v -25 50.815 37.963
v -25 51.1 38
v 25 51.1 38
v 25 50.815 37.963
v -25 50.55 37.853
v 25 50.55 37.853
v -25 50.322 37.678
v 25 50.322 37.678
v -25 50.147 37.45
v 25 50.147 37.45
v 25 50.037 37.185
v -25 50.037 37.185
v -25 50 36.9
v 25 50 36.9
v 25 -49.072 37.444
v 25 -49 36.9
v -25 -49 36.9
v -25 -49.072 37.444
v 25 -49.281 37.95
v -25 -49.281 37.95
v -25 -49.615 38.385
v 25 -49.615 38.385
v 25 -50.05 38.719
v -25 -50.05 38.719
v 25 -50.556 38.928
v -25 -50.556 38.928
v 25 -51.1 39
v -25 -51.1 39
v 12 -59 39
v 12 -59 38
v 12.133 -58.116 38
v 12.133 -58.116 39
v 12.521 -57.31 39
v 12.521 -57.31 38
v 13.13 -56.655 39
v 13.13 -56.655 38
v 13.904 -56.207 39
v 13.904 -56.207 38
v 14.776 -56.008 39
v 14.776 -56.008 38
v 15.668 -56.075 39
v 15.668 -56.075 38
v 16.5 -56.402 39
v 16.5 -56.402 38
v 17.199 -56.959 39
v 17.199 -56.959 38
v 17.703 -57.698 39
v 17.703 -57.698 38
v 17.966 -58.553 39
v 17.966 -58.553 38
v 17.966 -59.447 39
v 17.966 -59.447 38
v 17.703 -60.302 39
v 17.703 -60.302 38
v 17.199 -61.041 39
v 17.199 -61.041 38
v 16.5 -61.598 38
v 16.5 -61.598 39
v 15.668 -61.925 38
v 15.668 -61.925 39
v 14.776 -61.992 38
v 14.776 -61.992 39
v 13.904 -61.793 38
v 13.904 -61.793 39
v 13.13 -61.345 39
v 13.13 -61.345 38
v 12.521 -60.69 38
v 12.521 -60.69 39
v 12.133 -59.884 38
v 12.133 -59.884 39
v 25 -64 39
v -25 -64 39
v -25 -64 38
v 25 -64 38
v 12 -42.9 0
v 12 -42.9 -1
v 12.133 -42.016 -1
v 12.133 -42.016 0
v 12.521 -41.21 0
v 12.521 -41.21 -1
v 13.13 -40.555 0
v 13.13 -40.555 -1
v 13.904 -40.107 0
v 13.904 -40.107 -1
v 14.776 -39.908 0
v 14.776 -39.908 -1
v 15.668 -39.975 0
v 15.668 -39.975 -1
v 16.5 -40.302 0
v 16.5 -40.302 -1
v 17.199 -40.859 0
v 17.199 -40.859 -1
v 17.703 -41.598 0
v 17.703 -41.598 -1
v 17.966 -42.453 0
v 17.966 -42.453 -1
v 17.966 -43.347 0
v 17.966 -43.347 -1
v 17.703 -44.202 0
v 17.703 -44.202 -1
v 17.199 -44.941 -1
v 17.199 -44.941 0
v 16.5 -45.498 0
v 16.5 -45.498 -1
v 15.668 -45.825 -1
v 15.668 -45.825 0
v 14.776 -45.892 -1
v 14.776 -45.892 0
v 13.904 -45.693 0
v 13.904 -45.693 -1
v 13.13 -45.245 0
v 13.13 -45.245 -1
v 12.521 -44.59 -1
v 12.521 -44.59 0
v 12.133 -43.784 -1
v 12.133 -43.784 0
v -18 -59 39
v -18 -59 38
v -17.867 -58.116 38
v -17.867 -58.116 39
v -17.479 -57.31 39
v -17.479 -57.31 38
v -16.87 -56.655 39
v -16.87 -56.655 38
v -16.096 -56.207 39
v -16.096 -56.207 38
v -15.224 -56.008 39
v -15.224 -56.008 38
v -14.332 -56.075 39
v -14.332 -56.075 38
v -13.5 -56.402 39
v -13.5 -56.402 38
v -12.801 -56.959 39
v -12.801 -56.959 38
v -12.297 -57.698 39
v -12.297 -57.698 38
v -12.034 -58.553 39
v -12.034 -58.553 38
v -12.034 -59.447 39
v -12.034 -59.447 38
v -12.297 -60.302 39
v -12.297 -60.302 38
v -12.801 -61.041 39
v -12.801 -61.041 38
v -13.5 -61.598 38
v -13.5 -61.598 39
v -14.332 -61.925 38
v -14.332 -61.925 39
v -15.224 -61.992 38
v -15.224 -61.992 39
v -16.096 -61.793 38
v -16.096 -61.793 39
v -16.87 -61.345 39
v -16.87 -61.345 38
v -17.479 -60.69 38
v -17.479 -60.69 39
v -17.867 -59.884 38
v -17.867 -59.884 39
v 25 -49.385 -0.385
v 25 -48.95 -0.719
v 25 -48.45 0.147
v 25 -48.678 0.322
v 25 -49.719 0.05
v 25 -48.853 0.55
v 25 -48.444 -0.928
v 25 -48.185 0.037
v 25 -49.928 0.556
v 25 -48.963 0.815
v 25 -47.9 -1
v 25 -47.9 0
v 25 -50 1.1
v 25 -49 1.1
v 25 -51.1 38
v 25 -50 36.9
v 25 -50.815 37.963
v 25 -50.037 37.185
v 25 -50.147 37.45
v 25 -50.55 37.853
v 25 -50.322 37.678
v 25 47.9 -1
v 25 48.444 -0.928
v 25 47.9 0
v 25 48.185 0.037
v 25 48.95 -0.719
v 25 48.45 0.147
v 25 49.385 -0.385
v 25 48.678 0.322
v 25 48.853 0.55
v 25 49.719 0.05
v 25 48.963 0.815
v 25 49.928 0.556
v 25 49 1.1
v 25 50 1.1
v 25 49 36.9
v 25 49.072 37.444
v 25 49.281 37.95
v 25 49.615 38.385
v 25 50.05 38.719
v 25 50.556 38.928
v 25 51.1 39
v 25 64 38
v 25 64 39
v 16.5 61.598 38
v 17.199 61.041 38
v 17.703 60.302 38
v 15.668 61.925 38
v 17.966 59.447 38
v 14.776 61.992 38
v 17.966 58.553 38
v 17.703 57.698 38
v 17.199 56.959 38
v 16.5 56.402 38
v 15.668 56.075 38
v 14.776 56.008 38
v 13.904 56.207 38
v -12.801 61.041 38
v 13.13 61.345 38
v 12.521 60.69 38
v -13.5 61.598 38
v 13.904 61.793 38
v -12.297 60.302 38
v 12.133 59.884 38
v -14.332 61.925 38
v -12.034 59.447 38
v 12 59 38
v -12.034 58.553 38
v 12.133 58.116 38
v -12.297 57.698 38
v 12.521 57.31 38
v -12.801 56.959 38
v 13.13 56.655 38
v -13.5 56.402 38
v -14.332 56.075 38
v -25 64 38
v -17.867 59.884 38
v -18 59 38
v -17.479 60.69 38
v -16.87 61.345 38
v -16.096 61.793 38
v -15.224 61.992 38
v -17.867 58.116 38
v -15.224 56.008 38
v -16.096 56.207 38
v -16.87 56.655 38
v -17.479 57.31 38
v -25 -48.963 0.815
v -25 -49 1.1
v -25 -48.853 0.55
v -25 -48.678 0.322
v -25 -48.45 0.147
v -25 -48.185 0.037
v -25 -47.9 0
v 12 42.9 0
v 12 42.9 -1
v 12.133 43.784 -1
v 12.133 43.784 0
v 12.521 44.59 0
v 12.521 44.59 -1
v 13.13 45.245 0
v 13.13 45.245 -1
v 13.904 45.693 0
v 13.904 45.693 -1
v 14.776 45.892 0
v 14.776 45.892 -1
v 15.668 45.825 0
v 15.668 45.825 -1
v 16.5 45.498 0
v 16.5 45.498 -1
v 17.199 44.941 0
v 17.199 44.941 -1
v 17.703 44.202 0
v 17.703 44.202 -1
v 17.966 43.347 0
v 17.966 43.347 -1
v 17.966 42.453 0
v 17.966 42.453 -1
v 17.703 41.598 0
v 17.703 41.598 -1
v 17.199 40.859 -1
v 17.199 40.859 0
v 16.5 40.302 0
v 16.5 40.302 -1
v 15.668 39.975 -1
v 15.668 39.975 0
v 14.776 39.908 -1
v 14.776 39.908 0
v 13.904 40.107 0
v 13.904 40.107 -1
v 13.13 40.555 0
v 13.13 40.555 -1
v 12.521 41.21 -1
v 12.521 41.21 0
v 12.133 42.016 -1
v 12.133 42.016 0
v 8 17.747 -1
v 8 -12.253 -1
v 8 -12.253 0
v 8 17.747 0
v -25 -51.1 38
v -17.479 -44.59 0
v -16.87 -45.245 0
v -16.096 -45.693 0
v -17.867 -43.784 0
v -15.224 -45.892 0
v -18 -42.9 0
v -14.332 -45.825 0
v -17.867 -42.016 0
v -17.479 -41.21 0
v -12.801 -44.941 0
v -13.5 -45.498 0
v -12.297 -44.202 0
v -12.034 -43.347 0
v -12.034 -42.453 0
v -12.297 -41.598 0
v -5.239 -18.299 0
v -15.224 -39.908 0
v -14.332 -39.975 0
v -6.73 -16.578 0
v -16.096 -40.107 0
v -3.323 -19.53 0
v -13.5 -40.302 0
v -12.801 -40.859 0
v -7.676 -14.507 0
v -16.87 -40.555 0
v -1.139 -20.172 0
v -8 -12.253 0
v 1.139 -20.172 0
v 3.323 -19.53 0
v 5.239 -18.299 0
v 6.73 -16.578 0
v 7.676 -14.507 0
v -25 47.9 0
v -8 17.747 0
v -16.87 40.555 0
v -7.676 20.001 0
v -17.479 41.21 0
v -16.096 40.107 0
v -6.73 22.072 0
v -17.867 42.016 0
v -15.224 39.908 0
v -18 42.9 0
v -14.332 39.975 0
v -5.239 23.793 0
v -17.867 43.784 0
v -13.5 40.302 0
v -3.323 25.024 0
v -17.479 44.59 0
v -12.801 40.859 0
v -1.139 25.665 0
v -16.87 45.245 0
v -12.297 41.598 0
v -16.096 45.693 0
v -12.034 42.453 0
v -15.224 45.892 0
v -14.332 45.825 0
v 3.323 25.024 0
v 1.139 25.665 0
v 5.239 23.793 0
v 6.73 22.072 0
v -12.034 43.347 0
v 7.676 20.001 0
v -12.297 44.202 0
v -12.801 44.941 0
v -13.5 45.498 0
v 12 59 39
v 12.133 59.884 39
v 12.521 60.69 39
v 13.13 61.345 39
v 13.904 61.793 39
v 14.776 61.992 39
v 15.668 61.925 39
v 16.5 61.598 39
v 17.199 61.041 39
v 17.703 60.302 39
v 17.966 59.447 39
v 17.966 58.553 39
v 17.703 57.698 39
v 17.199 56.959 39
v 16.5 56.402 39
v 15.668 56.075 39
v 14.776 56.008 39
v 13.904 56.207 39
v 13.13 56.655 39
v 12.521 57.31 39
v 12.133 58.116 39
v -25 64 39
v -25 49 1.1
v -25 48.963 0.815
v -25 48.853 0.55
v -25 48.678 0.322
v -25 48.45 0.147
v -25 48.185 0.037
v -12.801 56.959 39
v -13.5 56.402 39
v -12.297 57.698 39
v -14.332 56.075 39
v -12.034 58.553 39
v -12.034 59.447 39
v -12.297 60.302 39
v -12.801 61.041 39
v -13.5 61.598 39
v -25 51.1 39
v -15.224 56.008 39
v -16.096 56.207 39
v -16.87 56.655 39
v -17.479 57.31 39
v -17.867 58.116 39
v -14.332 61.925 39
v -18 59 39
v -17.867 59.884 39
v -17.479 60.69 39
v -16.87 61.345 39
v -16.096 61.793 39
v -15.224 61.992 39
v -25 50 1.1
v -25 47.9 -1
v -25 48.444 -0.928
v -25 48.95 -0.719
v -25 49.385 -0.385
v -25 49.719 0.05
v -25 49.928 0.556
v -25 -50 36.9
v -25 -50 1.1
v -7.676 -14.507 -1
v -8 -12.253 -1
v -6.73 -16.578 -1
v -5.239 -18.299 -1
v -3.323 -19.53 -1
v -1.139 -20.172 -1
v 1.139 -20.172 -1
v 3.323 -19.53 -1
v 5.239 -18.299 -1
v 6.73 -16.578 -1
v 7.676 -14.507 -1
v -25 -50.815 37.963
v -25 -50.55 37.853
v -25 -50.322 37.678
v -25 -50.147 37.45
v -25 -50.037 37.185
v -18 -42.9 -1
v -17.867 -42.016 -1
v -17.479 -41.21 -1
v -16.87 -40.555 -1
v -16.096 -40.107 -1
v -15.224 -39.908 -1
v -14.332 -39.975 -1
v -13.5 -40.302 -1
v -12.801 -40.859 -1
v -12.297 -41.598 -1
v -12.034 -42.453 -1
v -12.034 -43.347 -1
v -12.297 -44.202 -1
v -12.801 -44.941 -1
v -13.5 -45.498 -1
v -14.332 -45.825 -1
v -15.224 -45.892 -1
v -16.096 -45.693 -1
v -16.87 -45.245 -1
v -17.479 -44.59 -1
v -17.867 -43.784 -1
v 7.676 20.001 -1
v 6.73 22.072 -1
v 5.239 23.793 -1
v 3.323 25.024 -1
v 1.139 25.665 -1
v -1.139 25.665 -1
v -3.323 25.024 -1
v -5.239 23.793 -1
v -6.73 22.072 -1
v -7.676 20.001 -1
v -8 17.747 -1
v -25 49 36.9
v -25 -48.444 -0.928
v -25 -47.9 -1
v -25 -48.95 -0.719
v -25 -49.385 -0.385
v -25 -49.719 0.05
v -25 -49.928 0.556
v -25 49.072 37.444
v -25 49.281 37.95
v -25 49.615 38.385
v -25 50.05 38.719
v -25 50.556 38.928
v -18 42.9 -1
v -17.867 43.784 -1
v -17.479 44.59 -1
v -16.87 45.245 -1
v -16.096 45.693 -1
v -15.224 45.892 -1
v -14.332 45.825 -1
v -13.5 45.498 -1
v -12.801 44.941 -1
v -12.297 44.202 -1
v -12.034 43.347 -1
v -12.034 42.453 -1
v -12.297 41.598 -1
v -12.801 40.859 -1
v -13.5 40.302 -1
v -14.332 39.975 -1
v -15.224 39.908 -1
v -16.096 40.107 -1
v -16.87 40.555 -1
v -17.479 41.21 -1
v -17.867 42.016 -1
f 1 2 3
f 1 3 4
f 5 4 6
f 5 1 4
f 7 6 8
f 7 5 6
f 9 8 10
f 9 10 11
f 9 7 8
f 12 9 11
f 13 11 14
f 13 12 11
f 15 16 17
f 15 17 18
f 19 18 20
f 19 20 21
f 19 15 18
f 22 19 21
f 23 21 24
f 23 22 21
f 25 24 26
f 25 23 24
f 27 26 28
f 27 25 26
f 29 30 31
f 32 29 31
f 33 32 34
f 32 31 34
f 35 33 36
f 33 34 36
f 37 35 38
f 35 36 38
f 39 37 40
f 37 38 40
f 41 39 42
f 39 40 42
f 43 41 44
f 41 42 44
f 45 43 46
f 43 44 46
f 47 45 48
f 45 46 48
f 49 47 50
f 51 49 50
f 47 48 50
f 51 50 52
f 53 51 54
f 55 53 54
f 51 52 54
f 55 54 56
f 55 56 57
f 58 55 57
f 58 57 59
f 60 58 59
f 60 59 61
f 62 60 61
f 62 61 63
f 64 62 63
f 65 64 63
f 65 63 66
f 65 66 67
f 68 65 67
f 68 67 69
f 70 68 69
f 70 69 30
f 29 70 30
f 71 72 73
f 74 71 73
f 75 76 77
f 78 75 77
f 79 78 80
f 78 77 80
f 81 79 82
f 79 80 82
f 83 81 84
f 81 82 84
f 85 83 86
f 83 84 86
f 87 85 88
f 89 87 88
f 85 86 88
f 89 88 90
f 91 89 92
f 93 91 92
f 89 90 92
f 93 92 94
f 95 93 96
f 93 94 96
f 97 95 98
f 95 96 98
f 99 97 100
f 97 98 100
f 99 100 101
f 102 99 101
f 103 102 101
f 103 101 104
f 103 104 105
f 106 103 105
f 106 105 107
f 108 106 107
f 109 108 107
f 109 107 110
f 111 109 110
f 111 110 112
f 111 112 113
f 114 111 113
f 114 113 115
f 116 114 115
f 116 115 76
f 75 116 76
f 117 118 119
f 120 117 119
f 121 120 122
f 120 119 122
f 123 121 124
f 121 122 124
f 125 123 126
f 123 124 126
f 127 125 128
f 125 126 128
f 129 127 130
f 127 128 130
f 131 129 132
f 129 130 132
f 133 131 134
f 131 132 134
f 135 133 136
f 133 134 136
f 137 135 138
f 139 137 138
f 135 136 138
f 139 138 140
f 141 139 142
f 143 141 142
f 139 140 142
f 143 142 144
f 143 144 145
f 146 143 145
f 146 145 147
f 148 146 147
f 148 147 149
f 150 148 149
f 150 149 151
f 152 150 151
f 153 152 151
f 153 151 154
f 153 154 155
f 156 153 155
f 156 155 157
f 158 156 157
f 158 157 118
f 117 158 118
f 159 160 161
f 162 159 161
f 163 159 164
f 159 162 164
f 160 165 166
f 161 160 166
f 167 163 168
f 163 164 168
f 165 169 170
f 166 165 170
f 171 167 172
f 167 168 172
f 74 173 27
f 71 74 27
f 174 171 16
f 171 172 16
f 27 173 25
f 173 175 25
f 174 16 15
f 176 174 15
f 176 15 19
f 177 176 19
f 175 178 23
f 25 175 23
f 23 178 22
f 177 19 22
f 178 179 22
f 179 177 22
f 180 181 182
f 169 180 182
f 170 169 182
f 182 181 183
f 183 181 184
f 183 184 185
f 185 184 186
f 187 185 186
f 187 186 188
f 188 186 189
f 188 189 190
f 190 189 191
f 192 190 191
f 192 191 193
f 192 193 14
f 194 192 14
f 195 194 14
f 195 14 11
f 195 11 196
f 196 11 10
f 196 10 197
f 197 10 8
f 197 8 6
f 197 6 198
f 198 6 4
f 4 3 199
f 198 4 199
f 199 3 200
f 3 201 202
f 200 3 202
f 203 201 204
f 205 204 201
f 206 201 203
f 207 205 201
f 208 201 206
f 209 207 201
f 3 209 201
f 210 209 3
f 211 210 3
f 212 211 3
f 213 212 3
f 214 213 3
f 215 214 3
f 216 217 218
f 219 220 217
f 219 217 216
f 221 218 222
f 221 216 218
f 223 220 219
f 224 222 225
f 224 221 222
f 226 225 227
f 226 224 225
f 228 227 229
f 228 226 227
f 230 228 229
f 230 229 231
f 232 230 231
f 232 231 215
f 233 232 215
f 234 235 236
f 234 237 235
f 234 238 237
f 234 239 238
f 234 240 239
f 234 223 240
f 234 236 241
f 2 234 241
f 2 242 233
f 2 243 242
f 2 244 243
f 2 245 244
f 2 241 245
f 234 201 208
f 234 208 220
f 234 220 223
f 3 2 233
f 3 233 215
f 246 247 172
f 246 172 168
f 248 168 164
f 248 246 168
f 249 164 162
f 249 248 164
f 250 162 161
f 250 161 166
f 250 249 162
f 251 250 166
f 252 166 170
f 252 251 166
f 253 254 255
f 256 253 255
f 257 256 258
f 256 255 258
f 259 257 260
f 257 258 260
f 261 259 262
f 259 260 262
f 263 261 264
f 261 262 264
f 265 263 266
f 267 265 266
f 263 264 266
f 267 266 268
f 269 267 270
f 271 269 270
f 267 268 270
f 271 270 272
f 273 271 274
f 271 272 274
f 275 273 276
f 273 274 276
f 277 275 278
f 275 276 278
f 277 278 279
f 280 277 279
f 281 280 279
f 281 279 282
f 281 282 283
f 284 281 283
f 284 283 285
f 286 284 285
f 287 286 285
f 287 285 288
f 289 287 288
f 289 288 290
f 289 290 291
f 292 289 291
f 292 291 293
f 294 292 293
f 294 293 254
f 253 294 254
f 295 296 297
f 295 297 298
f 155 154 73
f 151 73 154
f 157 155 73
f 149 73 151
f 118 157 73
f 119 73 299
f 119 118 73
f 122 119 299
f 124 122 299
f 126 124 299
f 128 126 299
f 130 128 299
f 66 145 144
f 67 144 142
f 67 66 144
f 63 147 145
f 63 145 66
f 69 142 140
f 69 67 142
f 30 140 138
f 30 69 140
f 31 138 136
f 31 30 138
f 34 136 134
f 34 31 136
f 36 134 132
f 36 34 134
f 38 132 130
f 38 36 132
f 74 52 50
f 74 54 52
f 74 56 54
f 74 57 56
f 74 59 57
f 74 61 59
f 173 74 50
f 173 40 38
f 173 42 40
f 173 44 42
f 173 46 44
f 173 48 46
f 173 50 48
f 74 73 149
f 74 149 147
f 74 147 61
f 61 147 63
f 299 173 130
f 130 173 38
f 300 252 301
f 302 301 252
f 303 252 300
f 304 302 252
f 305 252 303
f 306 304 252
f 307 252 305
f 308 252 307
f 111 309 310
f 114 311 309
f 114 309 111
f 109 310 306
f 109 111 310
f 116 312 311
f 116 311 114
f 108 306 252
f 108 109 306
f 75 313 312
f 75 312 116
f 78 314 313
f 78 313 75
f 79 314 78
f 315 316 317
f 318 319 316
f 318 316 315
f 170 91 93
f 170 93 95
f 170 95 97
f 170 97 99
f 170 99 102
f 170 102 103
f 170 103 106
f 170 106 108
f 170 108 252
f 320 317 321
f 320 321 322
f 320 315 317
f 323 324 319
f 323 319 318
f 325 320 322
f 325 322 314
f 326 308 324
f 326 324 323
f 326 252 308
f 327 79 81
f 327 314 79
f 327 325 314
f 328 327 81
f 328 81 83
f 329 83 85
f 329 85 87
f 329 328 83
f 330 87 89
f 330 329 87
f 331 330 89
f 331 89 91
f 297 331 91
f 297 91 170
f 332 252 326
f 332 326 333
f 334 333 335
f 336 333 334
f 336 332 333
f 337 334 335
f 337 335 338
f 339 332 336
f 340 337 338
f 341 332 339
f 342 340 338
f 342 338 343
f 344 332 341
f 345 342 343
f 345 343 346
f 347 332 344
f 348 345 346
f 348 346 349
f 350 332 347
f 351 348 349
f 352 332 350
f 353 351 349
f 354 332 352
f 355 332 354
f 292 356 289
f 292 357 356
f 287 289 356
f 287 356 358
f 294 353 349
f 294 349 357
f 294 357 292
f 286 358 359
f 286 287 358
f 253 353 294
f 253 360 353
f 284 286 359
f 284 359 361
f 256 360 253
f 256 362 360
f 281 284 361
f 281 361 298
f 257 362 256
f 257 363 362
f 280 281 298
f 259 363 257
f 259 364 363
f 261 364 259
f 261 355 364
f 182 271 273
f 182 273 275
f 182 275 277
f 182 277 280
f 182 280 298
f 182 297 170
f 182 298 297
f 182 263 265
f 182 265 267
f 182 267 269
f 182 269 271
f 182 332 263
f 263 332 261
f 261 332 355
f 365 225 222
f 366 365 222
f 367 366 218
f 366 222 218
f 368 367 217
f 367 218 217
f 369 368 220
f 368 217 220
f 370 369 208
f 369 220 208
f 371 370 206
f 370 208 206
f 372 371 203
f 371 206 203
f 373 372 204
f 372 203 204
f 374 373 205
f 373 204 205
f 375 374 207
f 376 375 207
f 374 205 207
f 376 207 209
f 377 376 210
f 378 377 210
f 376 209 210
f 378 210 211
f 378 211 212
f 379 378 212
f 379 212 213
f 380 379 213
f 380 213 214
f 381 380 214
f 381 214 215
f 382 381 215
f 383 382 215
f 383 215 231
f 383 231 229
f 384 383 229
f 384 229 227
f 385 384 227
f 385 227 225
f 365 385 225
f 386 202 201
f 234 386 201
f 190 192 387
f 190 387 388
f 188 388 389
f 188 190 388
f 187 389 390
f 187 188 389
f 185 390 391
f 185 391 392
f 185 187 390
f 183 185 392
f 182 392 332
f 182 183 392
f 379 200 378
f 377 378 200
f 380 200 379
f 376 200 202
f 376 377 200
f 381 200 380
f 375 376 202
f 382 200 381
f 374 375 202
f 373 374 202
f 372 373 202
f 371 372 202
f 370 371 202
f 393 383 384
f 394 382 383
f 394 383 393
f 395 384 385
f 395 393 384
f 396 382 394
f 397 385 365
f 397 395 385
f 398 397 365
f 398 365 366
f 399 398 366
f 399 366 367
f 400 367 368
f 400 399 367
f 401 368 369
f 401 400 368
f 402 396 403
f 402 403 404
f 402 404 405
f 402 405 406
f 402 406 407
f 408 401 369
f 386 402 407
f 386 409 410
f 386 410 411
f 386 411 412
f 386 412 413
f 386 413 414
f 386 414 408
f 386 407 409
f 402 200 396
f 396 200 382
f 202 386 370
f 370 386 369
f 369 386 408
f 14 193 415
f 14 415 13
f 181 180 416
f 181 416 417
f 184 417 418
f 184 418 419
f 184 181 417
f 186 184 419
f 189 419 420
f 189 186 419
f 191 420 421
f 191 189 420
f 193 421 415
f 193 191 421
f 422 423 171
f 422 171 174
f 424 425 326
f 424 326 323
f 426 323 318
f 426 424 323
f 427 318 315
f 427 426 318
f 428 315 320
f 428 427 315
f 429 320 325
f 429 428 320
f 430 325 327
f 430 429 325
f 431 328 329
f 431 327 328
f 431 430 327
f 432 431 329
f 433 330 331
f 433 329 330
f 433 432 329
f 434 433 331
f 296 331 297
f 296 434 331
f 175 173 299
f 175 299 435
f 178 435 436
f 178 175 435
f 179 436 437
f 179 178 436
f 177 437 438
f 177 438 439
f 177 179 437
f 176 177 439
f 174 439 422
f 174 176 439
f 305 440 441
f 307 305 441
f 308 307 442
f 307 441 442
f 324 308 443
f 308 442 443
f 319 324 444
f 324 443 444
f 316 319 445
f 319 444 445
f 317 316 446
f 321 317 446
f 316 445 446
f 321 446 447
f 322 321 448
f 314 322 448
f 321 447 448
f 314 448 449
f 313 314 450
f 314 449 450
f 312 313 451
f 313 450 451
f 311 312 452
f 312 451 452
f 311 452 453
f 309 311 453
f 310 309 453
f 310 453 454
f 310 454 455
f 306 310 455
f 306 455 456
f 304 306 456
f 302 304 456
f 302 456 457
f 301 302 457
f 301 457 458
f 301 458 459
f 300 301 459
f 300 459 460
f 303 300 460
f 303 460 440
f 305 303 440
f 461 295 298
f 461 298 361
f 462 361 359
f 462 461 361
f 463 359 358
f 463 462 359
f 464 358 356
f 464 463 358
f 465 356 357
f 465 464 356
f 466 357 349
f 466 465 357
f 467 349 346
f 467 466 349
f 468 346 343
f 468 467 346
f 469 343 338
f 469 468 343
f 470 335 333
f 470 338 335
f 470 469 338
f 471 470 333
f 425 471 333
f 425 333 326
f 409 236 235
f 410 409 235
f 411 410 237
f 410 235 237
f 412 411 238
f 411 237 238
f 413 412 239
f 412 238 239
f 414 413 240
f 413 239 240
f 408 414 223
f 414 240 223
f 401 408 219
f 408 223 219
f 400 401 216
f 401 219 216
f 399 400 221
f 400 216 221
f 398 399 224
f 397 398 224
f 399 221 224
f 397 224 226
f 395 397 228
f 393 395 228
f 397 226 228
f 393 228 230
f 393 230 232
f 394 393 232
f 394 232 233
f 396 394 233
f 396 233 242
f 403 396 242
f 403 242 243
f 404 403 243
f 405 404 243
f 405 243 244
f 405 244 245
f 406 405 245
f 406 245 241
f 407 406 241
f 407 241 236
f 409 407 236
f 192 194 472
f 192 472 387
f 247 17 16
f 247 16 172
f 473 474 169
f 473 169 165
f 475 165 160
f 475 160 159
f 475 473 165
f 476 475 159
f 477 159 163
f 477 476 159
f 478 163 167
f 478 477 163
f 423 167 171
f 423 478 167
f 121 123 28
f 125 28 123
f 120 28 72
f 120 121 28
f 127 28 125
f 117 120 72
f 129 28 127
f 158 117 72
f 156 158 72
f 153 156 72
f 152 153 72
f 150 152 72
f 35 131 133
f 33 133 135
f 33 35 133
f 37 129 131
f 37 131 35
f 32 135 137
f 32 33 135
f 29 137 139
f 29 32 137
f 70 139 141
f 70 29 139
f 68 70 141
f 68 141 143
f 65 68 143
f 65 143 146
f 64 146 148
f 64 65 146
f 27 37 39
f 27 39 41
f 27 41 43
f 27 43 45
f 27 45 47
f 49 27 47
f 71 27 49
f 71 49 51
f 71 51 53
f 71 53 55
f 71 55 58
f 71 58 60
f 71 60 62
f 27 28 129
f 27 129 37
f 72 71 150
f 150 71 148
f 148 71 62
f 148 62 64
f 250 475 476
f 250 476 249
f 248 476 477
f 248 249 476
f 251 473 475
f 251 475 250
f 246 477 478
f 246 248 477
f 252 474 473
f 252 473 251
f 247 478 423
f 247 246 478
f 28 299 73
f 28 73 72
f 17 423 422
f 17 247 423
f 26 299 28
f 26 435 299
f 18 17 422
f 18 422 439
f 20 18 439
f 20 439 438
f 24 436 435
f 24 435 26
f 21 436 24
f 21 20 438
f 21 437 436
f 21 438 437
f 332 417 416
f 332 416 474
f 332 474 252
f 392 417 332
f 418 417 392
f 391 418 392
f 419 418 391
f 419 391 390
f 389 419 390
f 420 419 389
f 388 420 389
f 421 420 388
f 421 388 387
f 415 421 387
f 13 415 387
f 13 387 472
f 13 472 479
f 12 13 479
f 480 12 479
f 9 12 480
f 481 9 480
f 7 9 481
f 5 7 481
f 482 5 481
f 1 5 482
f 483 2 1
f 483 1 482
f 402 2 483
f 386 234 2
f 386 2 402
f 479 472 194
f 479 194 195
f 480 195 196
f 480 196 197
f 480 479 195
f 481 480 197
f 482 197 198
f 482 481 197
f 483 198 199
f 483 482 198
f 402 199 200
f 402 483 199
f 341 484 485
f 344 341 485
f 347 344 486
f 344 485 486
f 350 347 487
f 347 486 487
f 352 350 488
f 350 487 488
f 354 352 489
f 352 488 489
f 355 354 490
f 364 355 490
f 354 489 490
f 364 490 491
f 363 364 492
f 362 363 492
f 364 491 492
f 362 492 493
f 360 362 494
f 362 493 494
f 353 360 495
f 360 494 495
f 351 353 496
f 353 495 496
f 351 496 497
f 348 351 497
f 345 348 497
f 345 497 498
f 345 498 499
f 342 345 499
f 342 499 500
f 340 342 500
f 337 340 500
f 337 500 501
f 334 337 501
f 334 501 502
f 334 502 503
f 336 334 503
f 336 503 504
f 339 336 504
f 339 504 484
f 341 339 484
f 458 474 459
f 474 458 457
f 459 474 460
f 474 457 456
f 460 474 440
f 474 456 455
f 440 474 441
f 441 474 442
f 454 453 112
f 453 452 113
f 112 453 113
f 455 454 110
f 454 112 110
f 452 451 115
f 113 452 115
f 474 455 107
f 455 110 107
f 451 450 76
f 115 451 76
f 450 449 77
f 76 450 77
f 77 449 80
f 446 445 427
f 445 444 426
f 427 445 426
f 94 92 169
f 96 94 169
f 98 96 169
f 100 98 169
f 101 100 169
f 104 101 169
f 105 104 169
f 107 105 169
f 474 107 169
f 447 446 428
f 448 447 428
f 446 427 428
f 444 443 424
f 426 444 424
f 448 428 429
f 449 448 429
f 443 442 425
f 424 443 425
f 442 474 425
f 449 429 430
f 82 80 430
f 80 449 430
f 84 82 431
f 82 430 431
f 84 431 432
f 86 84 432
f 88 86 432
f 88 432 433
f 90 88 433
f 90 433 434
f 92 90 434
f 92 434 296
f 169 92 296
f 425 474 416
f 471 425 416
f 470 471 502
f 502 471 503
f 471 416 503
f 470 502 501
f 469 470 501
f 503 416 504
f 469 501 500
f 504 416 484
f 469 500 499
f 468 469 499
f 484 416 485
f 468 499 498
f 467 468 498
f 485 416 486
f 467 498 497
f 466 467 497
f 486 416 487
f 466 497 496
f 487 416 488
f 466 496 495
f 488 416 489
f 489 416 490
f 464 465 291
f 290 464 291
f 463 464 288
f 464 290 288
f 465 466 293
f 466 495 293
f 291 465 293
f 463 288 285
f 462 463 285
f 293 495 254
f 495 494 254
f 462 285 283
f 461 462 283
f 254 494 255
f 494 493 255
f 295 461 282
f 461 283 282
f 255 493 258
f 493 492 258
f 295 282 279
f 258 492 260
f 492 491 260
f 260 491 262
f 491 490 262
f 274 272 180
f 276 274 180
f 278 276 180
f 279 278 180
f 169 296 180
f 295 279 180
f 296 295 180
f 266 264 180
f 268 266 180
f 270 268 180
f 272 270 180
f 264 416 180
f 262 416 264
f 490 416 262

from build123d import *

# Parameters (mm, degrees)
SKETCH3_W                      = 50
SKETCH3_H                      = 100
BASE_FLANGE1_DEPTH             = 1
EDGE_FLANGE1_STRIP_W           = 6.2
EDGE_FLANGE1_STRIP_H           = 1
EDGE_FLANGE1_STRIP_CUT_DEPTH   = 50
EDGE_FLANGE1_STRIP_2_W         = 6.2
EDGE_FLANGE1_STRIP_2_H         = 1
EDGE_FLANGE1_STRIP_CUT_2_DEPTH = 50
EDGE_FLANGE1_DEPTH             = 50
EDGE_FLANGE1_BEND_DEPTH        = 50
EDGE_FLANGE2_STRIP_W           = 6.2
EDGE_FLANGE2_STRIP_H           = 1
EDGE_FLANGE2_STRIP_CUT_DEPTH   = 50
EDGE_FLANGE2_STRIP_2_W         = 6.2
EDGE_FLANGE2_STRIP_2_H         = 1
EDGE_FLANGE2_STRIP_CUT_2_DEPTH = 50
EDGE_FLANGE2_DEPTH             = 50
EDGE_FLANGE2_BEND_DEPTH        = 50
SKETCH20_R                     = 3
CUT_EXTRUDE1_DEPTH             = 94


# Sheet-metal steps are written as plain solids
with BuildPart() as part:
    # Sketch3 → Base-Flange1 (new body)
    with BuildSketch(Plane.XY):
        Rectangle(SKETCH3_W, SKETCH3_H)
    extrude(amount=-BASE_FLANGE1_DEPTH)

    # Edge-Flange1 strip (across the edge) → Edge-Flange1 strip cut (cut)
    with BuildSketch(Plane(origin=(-25, -50, 0), x_dir=(0, 1, 0), z_dir=(1, 0, 0))):
        with Locations((-1, -0.5)):
            Rectangle(EDGE_FLANGE1_STRIP_W, EDGE_FLANGE1_STRIP_H)
    extrude(amount=EDGE_FLANGE1_STRIP_CUT_DEPTH, mode=Mode.SUBTRACT)

    # Edge-Flange1 strip 2 (across the edge) → Edge-Flange1 strip cut 2 (cut)
    with BuildSketch(Plane(origin=(25, 50, 0), x_dir=(0, -1, 0), z_dir=(-1, 0, 0))):
        with Locations((-1, -0.5)):
            Rectangle(EDGE_FLANGE1_STRIP_2_W, EDGE_FLANGE1_STRIP_2_H)
    extrude(amount=EDGE_FLANGE1_STRIP_CUT_2_DEPTH, mode=Mode.SUBTRACT)

    # Edge-Flange1 section (across the edge) → Edge-Flange1 (add)
    with BuildSketch(Plane(origin=(-25, -50, 0), x_dir=(0, 1, 0), z_dir=(1, 0, 0))):
        with BuildLine():
            Line((0, 1.1), (0, 39))
            Line((0, 39), (1, 39))
            Line((1, 39), (1, 1.1))
            ThreePointArc((1, 1.1), (1.322182541, 0.322182541), (2.1, 0))
            Line((2.1, 0), (2.1, -1))
            ThreePointArc((2.1, -1), (0.61507576, -0.38492424), (0, 1.1))
        make_face()
    extrude(amount=EDGE_FLANGE1_DEPTH)

    # Edge-Flange1 section 2 (across the edge) → Edge-Flange1 bend (add)
    with BuildSketch(Plane(origin=(25, 50, 0), x_dir=(0, -1, 0), z_dir=(-1, 0, 0))):
        with BuildLine():
            Line((0, 1.1), (0, 39))
            Line((0, 39), (1, 39))
            Line((1, 39), (1, 1.1))
            ThreePointArc((1, 1.1), (1.322182541, 0.322182541), (2.1, 0))
            Line((2.1, 0), (2.1, -1))
            ThreePointArc((2.1, -1), (0.61507576, -0.38492424), (0, 1.1))
        make_face()
    extrude(amount=EDGE_FLANGE1_BEND_DEPTH)

    # Edge-Flange2 strip (across the edge) → Edge-Flange2 strip cut (cut)
    with BuildSketch(Plane(origin=(25, -50, 39), x_dir=(0, 0, -1), z_dir=(-1, 0, 0))):
        with Locations((-1, -0.5)):
            Rectangle(EDGE_FLANGE2_STRIP_W, EDGE_FLANGE2_STRIP_H)
    extrude(amount=EDGE_FLANGE2_STRIP_CUT_DEPTH, mode=Mode.SUBTRACT)

    # Edge-Flange2 strip 2 (across the edge) → Edge-Flange2 strip cut 2 (cut)
    with BuildSketch(Plane(origin=(-25, 50, 39), x_dir=(0, 0, -1), z_dir=(1, 0, 0))):
        with Locations((-1, -0.5)):
            Rectangle(EDGE_FLANGE2_STRIP_2_W, EDGE_FLANGE2_STRIP_2_H)
    extrude(amount=EDGE_FLANGE2_STRIP_CUT_2_DEPTH, mode=Mode.SUBTRACT)

    # Edge-Flange2 section (across the edge) → Edge-Flange2 (add)
    with BuildSketch(Plane(origin=(25, -50, 39), x_dir=(0, 0, -1), z_dir=(-1, 0, 0))):
        with BuildLine():
            Line((0, 1.1), (0, 14))
            Line((0, 14), (1, 14))
            Line((1, 14), (1, 1.1))
            ThreePointArc((1, 1.1), (1.322182541, 0.322182541), (2.1, 0))
            Line((2.1, 0), (2.1, -1))
            ThreePointArc((2.1, -1), (0.61507576, -0.38492424), (0, 1.1))
        make_face()
    extrude(amount=EDGE_FLANGE2_DEPTH)

    # Edge-Flange2 section 2 (across the edge) → Edge-Flange2 bend (add)
    with BuildSketch(Plane(origin=(-25, 50, 39), x_dir=(0, 0, -1), z_dir=(1, 0, 0))):
        with BuildLine():
            Line((0, 1.1), (0, 14))
            Line((0, 14), (1, 14))
            Line((1, 14), (1, 1.1))
            ThreePointArc((1, 1.1), (1.322182541, 0.322182541), (2.1, 0))
            Line((2.1, 0), (2.1, -1))
            ThreePointArc((2.1, -1), (0.61507576, -0.38492424), (0, 1.1))
        make_face()
    extrude(amount=EDGE_FLANGE2_BEND_DEPTH)

    # Sketch20 → Cut-Extrude1 (cut)
    with BuildSketch(Plane(origin=(0, 0, -1), x_dir=(-1, 0, 0), z_dir=(0, 0, -1))):
        with Locations((15, 42.9)):
            Circle(SKETCH20_R)
        with Locations((-15, 42.9)):
            Circle(SKETCH20_R)
        with Locations((15, 59)):
            Circle(SKETCH20_R)
        with Locations((-15, 59)):
            Circle(SKETCH20_R)
        with Locations((-15, -59)):
            Circle(SKETCH20_R)
        with Locations((15, -59)):
            Circle(SKETCH20_R)
        with Locations((15, -42.9)):
            Circle(SKETCH20_R)
        with Locations((-15, -42.9)):
            Circle(SKETCH20_R)
        with BuildLine():
            Line((8, 17.746865737), (8, -12.253134263))
            ThreePointArc((8, -12.253134263), (0, -20.253134263), (-8, -12.253134263))
            Line((-8, -12.253134263), (-8, 17.746865737))
            ThreePointArc((-8, 17.746865737), (0, 25.746865737), (8, 17.746865737))
        make_face()
    extrude(amount=-CUT_EXTRUDE1_DEPTH, mode=Mode.SUBTRACT)


solid = part.part
